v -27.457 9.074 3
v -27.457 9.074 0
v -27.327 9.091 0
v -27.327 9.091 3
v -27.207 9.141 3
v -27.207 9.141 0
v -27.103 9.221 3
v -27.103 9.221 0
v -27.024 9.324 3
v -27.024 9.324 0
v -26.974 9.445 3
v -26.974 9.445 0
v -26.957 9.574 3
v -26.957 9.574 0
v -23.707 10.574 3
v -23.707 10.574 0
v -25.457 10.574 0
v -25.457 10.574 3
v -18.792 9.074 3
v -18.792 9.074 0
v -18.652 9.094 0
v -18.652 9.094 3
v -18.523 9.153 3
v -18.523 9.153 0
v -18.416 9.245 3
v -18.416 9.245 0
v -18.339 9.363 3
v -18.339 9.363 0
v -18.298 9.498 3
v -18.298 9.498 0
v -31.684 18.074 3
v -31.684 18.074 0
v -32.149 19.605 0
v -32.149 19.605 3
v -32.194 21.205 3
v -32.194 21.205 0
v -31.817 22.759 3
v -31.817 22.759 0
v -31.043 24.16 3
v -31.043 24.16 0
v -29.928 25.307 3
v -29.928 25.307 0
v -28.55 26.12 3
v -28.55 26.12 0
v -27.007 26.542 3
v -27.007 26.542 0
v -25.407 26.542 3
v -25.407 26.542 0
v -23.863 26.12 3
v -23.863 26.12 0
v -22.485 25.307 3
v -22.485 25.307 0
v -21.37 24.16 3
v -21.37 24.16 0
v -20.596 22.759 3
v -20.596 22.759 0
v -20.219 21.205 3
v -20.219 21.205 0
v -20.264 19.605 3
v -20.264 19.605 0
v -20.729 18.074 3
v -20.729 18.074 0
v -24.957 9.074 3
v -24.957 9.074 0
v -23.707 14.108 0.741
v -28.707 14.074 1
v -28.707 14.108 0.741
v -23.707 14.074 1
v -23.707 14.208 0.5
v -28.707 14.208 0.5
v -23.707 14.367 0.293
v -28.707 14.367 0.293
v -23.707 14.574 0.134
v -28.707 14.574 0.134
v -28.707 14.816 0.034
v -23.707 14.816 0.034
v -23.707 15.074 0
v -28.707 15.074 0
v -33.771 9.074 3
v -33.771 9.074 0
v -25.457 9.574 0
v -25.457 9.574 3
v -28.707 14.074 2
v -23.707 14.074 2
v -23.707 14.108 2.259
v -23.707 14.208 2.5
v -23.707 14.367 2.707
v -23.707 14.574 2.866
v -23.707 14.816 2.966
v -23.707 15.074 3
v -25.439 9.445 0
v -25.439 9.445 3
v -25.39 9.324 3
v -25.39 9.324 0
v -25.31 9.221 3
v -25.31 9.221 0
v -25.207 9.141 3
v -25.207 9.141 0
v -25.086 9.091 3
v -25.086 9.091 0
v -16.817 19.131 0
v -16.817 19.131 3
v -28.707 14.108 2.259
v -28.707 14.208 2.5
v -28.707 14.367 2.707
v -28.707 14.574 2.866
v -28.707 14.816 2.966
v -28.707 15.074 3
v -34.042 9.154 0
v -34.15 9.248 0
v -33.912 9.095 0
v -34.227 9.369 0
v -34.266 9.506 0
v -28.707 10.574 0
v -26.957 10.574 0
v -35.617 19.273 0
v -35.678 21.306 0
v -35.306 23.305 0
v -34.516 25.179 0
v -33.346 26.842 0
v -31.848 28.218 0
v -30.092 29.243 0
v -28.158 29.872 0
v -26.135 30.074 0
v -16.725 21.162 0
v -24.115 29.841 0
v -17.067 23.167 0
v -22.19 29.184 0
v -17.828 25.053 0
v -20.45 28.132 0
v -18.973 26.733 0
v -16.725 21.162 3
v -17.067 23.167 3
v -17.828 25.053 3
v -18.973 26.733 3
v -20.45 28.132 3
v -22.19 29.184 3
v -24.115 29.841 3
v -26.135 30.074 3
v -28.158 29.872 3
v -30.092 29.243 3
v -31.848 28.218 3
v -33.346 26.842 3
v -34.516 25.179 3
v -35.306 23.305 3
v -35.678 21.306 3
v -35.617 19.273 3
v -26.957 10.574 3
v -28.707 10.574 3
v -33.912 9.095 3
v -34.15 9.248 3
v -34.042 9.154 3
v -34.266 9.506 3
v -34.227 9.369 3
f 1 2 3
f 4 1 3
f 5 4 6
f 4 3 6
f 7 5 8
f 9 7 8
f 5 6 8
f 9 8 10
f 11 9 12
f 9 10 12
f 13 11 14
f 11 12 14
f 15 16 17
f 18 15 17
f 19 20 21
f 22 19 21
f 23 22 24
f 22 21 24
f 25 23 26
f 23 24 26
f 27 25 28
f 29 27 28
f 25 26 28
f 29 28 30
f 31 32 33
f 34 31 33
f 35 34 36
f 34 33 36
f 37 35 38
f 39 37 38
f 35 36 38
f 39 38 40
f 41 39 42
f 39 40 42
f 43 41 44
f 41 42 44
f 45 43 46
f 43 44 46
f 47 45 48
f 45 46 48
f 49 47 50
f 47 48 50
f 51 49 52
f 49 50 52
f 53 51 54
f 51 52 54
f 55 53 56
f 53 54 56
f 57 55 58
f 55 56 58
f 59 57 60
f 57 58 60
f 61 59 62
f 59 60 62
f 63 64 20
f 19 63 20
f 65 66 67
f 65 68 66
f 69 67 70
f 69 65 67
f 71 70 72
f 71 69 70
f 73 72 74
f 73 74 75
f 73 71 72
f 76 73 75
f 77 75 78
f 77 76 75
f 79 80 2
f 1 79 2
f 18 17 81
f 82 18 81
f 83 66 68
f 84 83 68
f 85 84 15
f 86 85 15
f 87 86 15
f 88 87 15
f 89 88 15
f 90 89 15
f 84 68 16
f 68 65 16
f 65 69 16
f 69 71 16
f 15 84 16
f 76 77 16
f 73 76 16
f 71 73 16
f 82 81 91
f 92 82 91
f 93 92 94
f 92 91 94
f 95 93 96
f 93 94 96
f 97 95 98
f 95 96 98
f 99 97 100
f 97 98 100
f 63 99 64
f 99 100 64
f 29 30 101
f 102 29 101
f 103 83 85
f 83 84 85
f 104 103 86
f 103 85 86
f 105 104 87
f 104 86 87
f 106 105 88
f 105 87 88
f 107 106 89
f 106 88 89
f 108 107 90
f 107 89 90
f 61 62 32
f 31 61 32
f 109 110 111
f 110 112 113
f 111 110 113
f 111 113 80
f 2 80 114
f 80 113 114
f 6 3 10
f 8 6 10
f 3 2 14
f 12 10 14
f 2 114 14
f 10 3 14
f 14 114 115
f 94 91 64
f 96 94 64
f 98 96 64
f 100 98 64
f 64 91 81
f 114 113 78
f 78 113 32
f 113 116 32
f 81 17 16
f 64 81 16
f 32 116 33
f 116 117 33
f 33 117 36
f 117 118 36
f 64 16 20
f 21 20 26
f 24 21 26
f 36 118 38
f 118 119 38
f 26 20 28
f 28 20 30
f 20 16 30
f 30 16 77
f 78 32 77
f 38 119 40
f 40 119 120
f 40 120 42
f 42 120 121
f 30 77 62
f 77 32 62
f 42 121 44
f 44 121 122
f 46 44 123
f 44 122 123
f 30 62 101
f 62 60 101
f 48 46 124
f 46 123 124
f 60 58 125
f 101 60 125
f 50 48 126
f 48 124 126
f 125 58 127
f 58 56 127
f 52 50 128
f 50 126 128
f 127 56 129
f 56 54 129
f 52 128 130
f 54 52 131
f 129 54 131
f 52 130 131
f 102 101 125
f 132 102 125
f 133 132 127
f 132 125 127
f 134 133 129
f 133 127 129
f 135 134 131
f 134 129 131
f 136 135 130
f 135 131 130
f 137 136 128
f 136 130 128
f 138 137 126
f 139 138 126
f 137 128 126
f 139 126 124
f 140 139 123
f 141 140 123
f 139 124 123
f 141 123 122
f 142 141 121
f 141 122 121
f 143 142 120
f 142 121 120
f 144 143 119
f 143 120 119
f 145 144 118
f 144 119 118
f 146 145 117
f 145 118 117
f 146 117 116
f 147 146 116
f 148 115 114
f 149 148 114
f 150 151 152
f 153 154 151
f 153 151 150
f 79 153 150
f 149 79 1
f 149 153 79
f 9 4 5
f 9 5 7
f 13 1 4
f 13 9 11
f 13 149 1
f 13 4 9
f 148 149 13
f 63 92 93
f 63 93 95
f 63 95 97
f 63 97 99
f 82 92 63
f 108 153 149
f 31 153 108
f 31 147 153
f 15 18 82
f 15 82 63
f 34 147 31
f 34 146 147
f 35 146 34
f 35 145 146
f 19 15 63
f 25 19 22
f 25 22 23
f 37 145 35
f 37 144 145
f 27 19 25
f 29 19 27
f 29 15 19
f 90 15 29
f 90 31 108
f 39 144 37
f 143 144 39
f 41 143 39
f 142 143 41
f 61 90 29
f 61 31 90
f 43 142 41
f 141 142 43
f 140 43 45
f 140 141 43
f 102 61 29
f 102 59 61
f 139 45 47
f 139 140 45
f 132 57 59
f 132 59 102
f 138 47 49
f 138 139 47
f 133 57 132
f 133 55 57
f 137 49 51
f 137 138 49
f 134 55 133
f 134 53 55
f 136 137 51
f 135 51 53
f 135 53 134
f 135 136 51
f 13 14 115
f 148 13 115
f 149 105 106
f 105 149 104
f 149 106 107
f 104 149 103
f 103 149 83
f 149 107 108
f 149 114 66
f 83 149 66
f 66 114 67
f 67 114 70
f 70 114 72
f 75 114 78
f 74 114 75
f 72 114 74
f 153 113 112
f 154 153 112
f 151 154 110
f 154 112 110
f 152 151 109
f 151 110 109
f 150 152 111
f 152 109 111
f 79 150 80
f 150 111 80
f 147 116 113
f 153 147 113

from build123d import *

# Parameters (mm, degrees)
F1_DEPTH = 3
F2_R     = 1


with BuildPart() as f1:
    # F0 (on Top) → F1 (new body)
    with BuildSketch(Plane.XY):
        with BuildLine():
            Line((-28.706517, 10.57433), (-28.706517, 14.07433))
            Line((-28.706517, 14.07433), (-23.706517, 14.07433))
            Line((-23.706517, 14.07433), (-23.706517, 10.57433))
            Line((-23.706517, 10.57433), (-25.456517, 10.57433))
            Line((-25.456517, 10.57433), (-25.456517, 9.57433))
            ThreePointArc((-25.456517, 9.57433), (-25.31007, 9.220777), (-24.956517, 9.07433))
            Line((-24.956517, 9.07433), (-23.706517, 9.07433))
            Line((-23.706517, 9.07433), (-22.618948, 9.07433))
            Line((-22.618948, 9.07433), (-18.791793, 9.07433))
            ThreePointArc((-18.791793, 9.07433), (-18.466205, 9.194866), (-18.297598, 9.498359))
            Line((-18.297598, 9.498359), (-16.816818, 19.130878))
            ThreePointArc((-16.816818, 19.130878), (-26.134756, 30.074059), (-35.61695, 19.272893))
            Line((-35.61695, 19.272893), (-34.266192, 9.505833))
            ThreePointArc((-34.266192, 9.505833), (-34.099351, 9.197336), (-33.770906, 9.07433))
            Line((-33.770906, 9.07433), (-29.794085, 9.07433))
            Line((-29.794085, 9.07433), (-27.456517, 9.07433))
            ThreePointArc((-27.456517, 9.07433), (-27.102963, 9.220777), (-26.956517, 9.57433))
            Line((-26.956517, 9.57433), (-26.956517, 10.57433))
            Line((-26.956517, 10.57433), (-28.706517, 10.57433))
        make_face()
        with BuildLine():
            Line((-20.729291, 18.07433), (-31.683742, 18.07433))
            ThreePointArc((-31.683742, 18.07433), (-26.206517, 26.595127), (-20.729291, 18.07433))
        make_face(mode=Mode.SUBTRACT)
    extrude(amount=F1_DEPTH)

    # F2
    f2_edges = [f1.edges().sort_by_distance(p)[0] for p in [
        (-26.206517, 14.07433, 3),
        (-26.206517, 14.07433, 0),
    ]]
    fillet(f2_edges, radius=F2_R)


solid = f1.part
